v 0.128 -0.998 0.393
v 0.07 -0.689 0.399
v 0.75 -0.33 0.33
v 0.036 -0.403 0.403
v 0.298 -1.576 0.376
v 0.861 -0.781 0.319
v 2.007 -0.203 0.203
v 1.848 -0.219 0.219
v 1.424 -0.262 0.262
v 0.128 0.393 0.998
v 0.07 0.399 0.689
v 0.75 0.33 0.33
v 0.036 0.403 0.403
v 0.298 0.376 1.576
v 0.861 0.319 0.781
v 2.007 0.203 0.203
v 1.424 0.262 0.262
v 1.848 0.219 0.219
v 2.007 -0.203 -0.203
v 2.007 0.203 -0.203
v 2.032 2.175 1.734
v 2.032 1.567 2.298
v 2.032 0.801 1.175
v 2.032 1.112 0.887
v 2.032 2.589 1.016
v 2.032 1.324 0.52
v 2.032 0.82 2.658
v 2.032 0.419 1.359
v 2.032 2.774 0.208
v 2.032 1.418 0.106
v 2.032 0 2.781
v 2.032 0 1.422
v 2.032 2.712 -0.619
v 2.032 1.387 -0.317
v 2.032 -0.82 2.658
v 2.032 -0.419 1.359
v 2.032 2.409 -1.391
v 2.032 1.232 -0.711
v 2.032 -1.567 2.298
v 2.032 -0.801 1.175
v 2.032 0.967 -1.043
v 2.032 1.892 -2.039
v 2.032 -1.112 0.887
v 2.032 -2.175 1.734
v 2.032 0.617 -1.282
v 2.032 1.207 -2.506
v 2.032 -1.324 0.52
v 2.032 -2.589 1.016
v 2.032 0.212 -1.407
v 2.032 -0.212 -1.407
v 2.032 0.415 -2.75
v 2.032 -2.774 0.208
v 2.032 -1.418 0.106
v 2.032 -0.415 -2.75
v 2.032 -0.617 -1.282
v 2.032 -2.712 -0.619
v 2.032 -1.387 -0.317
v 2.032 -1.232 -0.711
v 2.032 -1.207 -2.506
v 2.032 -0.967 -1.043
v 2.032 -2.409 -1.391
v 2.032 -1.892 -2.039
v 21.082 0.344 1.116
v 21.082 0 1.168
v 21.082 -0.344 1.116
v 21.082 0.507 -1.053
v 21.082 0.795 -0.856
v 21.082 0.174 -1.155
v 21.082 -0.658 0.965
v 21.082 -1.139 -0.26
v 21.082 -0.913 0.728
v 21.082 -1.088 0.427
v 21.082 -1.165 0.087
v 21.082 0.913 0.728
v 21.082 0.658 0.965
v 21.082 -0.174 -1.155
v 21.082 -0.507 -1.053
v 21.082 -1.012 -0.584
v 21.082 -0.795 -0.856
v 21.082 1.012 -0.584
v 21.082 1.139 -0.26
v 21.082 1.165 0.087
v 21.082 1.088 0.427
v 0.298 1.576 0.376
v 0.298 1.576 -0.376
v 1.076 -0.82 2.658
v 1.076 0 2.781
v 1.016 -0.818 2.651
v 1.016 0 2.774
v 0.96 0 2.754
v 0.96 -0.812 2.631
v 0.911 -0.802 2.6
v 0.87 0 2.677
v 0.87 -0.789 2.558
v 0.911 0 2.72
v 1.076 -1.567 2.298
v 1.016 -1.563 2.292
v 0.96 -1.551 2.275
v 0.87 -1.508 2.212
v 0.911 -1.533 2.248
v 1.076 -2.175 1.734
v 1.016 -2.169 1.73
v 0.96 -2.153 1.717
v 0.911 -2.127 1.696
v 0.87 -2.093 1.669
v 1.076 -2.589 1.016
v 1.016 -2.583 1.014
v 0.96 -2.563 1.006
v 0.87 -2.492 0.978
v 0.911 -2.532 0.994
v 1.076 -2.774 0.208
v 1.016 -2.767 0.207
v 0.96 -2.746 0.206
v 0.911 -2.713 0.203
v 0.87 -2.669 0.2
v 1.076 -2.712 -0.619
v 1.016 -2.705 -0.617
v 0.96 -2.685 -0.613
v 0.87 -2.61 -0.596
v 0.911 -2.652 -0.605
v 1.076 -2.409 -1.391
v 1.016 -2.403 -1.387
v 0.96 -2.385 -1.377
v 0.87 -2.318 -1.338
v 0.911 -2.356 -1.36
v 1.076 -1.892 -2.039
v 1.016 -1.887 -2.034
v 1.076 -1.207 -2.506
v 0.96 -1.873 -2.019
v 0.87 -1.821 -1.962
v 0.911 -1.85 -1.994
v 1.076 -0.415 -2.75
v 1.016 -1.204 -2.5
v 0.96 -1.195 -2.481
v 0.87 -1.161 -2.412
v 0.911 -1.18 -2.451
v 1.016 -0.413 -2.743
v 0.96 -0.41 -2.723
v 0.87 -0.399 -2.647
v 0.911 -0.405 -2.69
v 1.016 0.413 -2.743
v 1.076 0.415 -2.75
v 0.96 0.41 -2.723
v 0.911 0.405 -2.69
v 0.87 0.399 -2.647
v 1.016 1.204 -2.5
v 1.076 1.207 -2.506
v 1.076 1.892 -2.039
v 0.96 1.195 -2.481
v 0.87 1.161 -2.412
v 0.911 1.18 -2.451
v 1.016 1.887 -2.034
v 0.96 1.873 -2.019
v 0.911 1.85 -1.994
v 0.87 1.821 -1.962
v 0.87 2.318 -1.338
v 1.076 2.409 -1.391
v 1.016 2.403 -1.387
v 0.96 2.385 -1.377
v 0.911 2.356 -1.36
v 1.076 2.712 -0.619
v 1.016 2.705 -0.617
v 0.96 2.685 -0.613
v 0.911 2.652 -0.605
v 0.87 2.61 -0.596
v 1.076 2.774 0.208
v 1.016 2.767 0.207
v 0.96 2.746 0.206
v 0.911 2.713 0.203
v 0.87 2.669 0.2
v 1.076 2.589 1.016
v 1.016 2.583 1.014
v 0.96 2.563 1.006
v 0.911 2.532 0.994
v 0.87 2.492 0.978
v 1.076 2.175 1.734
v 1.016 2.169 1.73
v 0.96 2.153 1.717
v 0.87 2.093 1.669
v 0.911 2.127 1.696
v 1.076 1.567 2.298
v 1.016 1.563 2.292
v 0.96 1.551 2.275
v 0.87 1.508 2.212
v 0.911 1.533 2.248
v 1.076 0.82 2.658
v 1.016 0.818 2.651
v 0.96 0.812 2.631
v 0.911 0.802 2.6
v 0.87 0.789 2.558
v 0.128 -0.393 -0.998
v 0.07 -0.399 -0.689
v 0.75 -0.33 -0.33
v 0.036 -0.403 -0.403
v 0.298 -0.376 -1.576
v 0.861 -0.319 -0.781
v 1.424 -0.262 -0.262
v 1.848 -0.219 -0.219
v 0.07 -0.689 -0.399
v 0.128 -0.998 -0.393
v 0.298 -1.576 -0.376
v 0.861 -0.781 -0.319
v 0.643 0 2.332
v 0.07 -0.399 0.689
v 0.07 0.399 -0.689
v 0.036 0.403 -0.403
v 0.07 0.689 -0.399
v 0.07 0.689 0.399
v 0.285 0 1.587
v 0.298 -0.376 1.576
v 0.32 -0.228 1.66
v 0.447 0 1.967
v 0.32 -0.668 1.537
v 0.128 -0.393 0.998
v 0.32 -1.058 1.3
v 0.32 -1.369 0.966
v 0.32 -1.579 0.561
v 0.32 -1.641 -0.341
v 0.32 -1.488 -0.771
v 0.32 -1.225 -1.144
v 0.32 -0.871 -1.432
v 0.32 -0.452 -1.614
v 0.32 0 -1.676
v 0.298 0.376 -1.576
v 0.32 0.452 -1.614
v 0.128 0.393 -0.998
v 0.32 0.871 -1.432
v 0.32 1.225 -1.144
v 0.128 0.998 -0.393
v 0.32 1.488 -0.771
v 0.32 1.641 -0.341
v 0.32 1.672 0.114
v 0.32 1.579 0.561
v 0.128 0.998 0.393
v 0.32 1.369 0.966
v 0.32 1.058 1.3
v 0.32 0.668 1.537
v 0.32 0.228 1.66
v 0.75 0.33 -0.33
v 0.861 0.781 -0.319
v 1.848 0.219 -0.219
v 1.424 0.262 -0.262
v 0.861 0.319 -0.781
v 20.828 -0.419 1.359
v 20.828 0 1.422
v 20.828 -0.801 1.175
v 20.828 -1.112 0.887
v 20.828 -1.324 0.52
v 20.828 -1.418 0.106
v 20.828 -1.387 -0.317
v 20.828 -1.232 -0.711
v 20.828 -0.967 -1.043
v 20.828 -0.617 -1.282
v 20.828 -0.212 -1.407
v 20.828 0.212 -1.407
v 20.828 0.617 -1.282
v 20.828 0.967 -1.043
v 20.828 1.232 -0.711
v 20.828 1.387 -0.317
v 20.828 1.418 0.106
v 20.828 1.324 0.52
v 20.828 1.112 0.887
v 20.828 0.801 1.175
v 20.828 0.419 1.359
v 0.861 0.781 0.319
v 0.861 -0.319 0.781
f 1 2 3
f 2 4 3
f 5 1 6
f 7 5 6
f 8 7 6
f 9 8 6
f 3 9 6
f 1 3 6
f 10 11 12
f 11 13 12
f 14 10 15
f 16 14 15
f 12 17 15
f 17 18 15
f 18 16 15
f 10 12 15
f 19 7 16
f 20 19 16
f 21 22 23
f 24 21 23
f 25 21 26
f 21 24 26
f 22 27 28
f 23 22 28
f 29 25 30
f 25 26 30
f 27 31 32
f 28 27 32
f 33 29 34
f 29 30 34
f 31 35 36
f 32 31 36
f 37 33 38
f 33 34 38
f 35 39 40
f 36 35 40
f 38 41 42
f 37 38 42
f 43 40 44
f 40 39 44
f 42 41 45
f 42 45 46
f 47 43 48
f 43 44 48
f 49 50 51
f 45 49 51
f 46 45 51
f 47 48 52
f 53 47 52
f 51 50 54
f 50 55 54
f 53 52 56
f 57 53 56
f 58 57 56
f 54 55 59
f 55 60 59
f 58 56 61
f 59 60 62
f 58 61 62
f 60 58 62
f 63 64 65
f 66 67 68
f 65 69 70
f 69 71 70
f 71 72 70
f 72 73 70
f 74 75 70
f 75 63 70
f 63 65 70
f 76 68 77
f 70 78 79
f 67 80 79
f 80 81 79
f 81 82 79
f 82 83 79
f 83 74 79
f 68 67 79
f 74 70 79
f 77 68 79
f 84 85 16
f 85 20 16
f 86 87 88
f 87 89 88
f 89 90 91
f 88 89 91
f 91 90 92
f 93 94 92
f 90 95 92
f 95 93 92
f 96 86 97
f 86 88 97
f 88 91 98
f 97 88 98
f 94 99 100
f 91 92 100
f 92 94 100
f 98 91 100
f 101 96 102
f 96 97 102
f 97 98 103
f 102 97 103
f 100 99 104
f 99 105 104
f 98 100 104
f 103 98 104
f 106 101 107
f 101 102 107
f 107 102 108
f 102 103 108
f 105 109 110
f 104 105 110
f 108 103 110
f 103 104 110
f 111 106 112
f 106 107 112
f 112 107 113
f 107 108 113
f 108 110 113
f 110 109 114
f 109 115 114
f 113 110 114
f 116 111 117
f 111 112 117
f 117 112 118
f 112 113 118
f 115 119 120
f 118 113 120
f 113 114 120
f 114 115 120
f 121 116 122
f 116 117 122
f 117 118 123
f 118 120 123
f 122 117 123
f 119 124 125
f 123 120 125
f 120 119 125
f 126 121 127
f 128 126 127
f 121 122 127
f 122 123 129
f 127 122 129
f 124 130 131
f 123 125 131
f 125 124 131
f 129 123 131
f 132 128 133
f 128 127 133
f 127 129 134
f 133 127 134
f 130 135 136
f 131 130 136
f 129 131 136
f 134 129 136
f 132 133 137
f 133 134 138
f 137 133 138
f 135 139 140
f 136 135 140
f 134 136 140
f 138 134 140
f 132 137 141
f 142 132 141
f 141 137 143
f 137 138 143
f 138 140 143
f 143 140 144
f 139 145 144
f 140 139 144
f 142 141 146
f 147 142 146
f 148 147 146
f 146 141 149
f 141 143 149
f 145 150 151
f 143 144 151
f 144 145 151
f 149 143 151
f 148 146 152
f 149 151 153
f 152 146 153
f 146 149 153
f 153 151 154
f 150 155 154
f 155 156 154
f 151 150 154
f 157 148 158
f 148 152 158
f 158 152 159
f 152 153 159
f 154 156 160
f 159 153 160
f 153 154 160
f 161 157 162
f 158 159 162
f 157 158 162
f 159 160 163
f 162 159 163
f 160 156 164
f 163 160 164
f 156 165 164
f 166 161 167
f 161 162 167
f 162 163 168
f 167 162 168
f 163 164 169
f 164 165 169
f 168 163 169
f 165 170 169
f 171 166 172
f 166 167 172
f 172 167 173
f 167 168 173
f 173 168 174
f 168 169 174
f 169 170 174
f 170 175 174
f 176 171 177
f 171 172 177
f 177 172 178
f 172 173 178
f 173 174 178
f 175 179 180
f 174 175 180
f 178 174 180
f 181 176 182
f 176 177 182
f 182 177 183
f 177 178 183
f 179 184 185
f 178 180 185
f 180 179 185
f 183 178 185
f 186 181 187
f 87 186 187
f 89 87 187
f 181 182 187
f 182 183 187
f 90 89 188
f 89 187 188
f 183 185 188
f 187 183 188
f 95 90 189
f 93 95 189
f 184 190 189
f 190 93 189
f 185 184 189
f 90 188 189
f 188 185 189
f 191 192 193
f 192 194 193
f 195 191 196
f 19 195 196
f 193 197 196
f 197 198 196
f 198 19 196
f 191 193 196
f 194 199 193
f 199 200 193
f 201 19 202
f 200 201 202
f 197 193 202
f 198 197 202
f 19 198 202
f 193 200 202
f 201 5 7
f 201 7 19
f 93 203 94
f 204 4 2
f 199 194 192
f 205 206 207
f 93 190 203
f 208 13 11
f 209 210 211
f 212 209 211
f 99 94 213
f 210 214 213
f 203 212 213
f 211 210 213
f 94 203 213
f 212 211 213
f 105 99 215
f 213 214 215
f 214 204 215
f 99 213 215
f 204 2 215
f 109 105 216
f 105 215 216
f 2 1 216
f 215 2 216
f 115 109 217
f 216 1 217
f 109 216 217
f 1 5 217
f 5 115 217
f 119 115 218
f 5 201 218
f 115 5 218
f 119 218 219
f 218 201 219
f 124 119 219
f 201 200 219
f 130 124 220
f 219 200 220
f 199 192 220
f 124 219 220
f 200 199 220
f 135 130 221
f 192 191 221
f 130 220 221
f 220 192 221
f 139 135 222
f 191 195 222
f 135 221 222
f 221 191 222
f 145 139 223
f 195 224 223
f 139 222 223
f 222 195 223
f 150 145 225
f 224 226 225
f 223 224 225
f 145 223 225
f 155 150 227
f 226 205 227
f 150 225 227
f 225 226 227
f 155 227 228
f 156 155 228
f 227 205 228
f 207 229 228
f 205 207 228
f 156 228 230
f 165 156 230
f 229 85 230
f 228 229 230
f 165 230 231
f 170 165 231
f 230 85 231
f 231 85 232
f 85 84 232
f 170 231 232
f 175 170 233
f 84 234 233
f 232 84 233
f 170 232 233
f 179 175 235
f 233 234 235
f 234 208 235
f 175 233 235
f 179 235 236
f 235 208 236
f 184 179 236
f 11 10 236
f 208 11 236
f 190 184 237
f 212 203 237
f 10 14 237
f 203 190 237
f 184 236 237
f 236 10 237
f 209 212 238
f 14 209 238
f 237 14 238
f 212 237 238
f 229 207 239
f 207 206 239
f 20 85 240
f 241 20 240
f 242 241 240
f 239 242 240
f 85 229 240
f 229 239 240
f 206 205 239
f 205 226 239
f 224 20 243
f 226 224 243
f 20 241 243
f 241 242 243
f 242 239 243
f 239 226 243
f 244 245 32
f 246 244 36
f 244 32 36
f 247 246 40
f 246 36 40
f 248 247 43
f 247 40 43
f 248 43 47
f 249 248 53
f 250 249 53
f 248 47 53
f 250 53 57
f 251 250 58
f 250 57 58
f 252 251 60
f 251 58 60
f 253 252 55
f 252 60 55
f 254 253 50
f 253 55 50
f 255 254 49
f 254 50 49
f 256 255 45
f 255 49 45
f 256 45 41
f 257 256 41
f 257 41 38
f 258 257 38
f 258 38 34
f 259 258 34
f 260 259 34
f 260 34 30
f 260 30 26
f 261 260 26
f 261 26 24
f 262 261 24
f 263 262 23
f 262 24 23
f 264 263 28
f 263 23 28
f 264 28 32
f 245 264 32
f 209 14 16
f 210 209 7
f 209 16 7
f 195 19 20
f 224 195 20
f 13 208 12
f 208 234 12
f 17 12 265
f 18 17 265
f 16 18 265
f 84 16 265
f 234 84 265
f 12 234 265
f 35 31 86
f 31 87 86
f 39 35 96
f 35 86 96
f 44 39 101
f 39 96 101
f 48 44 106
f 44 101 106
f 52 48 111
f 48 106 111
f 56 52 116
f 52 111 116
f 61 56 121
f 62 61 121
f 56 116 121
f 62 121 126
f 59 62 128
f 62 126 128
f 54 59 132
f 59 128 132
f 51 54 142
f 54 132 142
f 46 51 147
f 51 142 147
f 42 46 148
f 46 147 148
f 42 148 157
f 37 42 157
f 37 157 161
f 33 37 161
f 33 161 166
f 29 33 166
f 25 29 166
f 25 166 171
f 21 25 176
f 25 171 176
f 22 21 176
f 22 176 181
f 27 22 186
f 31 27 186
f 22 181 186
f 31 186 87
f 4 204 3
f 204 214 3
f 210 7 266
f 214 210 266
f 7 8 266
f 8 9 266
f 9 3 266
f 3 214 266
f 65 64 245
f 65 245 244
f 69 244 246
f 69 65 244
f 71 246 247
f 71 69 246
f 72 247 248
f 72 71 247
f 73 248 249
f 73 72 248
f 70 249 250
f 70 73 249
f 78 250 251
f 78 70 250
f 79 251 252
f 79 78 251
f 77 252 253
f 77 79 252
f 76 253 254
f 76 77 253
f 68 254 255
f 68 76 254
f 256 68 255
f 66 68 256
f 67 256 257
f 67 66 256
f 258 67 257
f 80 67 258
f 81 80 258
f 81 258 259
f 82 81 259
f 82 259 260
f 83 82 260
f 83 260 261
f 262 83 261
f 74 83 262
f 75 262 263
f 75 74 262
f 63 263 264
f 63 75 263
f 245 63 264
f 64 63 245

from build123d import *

# Parameters (mm, degrees)
SKETCH3_W         = 0.8128
SKETCH3_H         = 3.6322
SKETCH4_W         = 0.4064
SKETCH4_H         = 0.4064
CIRPATTERN1_COUNT = 2
CIRPATTERN1_ANGLE = 90
CHAMFER1_SIZE     = 0.254


with BuildPart() as part:
    # BodySke → Base-Revolve (revolve)
    with BuildSketch(Plane.XY, mode=Mode.PRIVATE) as base_revolve_sk:
        with BuildLine():
            Line((2.032, 1.4224), (2.032, 2.7813))
            Line((2.032, 2.7813), (1.075646615, 2.7813))
            ThreePointArc((1.075646615, 2.7813), (0.960371669, 2.753635341), (0.87020729, 2.676667612))
            ThreePointArc((0.87020729, 2.676667612), (0.223015279, 1.407285528), (0, 0))
            Line((0, 0), (21.082, 0))
            Line((21.082, 0), (21.082, 1.4224))
            Line((21.082, 1.4224), (2.032, 1.4224))
        make_face()
    revolve(base_revolve_sk.sketch.rotate(Axis((-25.4, 0, 0), (1, 0, 0)), 90), axis=Axis((-25.4, 0, 0), (1, 0, 0)))  # turned: the seam where the file's is

    # Sketch3 → Cut-Loft1 section 0
    with BuildSketch(Plane(origin=(0, 0, 0), x_dir=(0, 0, -1), z_dir=(1, 0, 0))):
        Rectangle(SKETCH3_W, SKETCH3_H)
    # Sketch4 → Cut-Loft1 section 1
    with BuildSketch(Plane(origin=(2.0066, 0, 0), x_dir=(0, 0, -1), z_dir=(1, 0, 0))):
        Rectangle(SKETCH4_W, SKETCH4_H)
    cut_loft1 = loft(mode=Mode.SUBTRACT)

    # CirPattern1: Cut-Loft1 ×2 about axis
    cirpattern1_axis = Axis((0, 0, 0), (1, 0, 0))
    for i in range(1, CIRPATTERN1_COUNT):
        add(cut_loft1.rotate(cirpattern1_axis, i * CIRPATTERN1_ANGLE / (CIRPATTERN1_COUNT - 1)), mode=Mode.SUBTRACT)

    # Chamfer1
    chamfer1_edges = [part.edges().sort_by_distance(p)[0] for p in [
        (21.082, 0, -1.4224),
    ]]
    chamfer(chamfer1_edges, length=CHAMFER1_SIZE)


solid = part.part
